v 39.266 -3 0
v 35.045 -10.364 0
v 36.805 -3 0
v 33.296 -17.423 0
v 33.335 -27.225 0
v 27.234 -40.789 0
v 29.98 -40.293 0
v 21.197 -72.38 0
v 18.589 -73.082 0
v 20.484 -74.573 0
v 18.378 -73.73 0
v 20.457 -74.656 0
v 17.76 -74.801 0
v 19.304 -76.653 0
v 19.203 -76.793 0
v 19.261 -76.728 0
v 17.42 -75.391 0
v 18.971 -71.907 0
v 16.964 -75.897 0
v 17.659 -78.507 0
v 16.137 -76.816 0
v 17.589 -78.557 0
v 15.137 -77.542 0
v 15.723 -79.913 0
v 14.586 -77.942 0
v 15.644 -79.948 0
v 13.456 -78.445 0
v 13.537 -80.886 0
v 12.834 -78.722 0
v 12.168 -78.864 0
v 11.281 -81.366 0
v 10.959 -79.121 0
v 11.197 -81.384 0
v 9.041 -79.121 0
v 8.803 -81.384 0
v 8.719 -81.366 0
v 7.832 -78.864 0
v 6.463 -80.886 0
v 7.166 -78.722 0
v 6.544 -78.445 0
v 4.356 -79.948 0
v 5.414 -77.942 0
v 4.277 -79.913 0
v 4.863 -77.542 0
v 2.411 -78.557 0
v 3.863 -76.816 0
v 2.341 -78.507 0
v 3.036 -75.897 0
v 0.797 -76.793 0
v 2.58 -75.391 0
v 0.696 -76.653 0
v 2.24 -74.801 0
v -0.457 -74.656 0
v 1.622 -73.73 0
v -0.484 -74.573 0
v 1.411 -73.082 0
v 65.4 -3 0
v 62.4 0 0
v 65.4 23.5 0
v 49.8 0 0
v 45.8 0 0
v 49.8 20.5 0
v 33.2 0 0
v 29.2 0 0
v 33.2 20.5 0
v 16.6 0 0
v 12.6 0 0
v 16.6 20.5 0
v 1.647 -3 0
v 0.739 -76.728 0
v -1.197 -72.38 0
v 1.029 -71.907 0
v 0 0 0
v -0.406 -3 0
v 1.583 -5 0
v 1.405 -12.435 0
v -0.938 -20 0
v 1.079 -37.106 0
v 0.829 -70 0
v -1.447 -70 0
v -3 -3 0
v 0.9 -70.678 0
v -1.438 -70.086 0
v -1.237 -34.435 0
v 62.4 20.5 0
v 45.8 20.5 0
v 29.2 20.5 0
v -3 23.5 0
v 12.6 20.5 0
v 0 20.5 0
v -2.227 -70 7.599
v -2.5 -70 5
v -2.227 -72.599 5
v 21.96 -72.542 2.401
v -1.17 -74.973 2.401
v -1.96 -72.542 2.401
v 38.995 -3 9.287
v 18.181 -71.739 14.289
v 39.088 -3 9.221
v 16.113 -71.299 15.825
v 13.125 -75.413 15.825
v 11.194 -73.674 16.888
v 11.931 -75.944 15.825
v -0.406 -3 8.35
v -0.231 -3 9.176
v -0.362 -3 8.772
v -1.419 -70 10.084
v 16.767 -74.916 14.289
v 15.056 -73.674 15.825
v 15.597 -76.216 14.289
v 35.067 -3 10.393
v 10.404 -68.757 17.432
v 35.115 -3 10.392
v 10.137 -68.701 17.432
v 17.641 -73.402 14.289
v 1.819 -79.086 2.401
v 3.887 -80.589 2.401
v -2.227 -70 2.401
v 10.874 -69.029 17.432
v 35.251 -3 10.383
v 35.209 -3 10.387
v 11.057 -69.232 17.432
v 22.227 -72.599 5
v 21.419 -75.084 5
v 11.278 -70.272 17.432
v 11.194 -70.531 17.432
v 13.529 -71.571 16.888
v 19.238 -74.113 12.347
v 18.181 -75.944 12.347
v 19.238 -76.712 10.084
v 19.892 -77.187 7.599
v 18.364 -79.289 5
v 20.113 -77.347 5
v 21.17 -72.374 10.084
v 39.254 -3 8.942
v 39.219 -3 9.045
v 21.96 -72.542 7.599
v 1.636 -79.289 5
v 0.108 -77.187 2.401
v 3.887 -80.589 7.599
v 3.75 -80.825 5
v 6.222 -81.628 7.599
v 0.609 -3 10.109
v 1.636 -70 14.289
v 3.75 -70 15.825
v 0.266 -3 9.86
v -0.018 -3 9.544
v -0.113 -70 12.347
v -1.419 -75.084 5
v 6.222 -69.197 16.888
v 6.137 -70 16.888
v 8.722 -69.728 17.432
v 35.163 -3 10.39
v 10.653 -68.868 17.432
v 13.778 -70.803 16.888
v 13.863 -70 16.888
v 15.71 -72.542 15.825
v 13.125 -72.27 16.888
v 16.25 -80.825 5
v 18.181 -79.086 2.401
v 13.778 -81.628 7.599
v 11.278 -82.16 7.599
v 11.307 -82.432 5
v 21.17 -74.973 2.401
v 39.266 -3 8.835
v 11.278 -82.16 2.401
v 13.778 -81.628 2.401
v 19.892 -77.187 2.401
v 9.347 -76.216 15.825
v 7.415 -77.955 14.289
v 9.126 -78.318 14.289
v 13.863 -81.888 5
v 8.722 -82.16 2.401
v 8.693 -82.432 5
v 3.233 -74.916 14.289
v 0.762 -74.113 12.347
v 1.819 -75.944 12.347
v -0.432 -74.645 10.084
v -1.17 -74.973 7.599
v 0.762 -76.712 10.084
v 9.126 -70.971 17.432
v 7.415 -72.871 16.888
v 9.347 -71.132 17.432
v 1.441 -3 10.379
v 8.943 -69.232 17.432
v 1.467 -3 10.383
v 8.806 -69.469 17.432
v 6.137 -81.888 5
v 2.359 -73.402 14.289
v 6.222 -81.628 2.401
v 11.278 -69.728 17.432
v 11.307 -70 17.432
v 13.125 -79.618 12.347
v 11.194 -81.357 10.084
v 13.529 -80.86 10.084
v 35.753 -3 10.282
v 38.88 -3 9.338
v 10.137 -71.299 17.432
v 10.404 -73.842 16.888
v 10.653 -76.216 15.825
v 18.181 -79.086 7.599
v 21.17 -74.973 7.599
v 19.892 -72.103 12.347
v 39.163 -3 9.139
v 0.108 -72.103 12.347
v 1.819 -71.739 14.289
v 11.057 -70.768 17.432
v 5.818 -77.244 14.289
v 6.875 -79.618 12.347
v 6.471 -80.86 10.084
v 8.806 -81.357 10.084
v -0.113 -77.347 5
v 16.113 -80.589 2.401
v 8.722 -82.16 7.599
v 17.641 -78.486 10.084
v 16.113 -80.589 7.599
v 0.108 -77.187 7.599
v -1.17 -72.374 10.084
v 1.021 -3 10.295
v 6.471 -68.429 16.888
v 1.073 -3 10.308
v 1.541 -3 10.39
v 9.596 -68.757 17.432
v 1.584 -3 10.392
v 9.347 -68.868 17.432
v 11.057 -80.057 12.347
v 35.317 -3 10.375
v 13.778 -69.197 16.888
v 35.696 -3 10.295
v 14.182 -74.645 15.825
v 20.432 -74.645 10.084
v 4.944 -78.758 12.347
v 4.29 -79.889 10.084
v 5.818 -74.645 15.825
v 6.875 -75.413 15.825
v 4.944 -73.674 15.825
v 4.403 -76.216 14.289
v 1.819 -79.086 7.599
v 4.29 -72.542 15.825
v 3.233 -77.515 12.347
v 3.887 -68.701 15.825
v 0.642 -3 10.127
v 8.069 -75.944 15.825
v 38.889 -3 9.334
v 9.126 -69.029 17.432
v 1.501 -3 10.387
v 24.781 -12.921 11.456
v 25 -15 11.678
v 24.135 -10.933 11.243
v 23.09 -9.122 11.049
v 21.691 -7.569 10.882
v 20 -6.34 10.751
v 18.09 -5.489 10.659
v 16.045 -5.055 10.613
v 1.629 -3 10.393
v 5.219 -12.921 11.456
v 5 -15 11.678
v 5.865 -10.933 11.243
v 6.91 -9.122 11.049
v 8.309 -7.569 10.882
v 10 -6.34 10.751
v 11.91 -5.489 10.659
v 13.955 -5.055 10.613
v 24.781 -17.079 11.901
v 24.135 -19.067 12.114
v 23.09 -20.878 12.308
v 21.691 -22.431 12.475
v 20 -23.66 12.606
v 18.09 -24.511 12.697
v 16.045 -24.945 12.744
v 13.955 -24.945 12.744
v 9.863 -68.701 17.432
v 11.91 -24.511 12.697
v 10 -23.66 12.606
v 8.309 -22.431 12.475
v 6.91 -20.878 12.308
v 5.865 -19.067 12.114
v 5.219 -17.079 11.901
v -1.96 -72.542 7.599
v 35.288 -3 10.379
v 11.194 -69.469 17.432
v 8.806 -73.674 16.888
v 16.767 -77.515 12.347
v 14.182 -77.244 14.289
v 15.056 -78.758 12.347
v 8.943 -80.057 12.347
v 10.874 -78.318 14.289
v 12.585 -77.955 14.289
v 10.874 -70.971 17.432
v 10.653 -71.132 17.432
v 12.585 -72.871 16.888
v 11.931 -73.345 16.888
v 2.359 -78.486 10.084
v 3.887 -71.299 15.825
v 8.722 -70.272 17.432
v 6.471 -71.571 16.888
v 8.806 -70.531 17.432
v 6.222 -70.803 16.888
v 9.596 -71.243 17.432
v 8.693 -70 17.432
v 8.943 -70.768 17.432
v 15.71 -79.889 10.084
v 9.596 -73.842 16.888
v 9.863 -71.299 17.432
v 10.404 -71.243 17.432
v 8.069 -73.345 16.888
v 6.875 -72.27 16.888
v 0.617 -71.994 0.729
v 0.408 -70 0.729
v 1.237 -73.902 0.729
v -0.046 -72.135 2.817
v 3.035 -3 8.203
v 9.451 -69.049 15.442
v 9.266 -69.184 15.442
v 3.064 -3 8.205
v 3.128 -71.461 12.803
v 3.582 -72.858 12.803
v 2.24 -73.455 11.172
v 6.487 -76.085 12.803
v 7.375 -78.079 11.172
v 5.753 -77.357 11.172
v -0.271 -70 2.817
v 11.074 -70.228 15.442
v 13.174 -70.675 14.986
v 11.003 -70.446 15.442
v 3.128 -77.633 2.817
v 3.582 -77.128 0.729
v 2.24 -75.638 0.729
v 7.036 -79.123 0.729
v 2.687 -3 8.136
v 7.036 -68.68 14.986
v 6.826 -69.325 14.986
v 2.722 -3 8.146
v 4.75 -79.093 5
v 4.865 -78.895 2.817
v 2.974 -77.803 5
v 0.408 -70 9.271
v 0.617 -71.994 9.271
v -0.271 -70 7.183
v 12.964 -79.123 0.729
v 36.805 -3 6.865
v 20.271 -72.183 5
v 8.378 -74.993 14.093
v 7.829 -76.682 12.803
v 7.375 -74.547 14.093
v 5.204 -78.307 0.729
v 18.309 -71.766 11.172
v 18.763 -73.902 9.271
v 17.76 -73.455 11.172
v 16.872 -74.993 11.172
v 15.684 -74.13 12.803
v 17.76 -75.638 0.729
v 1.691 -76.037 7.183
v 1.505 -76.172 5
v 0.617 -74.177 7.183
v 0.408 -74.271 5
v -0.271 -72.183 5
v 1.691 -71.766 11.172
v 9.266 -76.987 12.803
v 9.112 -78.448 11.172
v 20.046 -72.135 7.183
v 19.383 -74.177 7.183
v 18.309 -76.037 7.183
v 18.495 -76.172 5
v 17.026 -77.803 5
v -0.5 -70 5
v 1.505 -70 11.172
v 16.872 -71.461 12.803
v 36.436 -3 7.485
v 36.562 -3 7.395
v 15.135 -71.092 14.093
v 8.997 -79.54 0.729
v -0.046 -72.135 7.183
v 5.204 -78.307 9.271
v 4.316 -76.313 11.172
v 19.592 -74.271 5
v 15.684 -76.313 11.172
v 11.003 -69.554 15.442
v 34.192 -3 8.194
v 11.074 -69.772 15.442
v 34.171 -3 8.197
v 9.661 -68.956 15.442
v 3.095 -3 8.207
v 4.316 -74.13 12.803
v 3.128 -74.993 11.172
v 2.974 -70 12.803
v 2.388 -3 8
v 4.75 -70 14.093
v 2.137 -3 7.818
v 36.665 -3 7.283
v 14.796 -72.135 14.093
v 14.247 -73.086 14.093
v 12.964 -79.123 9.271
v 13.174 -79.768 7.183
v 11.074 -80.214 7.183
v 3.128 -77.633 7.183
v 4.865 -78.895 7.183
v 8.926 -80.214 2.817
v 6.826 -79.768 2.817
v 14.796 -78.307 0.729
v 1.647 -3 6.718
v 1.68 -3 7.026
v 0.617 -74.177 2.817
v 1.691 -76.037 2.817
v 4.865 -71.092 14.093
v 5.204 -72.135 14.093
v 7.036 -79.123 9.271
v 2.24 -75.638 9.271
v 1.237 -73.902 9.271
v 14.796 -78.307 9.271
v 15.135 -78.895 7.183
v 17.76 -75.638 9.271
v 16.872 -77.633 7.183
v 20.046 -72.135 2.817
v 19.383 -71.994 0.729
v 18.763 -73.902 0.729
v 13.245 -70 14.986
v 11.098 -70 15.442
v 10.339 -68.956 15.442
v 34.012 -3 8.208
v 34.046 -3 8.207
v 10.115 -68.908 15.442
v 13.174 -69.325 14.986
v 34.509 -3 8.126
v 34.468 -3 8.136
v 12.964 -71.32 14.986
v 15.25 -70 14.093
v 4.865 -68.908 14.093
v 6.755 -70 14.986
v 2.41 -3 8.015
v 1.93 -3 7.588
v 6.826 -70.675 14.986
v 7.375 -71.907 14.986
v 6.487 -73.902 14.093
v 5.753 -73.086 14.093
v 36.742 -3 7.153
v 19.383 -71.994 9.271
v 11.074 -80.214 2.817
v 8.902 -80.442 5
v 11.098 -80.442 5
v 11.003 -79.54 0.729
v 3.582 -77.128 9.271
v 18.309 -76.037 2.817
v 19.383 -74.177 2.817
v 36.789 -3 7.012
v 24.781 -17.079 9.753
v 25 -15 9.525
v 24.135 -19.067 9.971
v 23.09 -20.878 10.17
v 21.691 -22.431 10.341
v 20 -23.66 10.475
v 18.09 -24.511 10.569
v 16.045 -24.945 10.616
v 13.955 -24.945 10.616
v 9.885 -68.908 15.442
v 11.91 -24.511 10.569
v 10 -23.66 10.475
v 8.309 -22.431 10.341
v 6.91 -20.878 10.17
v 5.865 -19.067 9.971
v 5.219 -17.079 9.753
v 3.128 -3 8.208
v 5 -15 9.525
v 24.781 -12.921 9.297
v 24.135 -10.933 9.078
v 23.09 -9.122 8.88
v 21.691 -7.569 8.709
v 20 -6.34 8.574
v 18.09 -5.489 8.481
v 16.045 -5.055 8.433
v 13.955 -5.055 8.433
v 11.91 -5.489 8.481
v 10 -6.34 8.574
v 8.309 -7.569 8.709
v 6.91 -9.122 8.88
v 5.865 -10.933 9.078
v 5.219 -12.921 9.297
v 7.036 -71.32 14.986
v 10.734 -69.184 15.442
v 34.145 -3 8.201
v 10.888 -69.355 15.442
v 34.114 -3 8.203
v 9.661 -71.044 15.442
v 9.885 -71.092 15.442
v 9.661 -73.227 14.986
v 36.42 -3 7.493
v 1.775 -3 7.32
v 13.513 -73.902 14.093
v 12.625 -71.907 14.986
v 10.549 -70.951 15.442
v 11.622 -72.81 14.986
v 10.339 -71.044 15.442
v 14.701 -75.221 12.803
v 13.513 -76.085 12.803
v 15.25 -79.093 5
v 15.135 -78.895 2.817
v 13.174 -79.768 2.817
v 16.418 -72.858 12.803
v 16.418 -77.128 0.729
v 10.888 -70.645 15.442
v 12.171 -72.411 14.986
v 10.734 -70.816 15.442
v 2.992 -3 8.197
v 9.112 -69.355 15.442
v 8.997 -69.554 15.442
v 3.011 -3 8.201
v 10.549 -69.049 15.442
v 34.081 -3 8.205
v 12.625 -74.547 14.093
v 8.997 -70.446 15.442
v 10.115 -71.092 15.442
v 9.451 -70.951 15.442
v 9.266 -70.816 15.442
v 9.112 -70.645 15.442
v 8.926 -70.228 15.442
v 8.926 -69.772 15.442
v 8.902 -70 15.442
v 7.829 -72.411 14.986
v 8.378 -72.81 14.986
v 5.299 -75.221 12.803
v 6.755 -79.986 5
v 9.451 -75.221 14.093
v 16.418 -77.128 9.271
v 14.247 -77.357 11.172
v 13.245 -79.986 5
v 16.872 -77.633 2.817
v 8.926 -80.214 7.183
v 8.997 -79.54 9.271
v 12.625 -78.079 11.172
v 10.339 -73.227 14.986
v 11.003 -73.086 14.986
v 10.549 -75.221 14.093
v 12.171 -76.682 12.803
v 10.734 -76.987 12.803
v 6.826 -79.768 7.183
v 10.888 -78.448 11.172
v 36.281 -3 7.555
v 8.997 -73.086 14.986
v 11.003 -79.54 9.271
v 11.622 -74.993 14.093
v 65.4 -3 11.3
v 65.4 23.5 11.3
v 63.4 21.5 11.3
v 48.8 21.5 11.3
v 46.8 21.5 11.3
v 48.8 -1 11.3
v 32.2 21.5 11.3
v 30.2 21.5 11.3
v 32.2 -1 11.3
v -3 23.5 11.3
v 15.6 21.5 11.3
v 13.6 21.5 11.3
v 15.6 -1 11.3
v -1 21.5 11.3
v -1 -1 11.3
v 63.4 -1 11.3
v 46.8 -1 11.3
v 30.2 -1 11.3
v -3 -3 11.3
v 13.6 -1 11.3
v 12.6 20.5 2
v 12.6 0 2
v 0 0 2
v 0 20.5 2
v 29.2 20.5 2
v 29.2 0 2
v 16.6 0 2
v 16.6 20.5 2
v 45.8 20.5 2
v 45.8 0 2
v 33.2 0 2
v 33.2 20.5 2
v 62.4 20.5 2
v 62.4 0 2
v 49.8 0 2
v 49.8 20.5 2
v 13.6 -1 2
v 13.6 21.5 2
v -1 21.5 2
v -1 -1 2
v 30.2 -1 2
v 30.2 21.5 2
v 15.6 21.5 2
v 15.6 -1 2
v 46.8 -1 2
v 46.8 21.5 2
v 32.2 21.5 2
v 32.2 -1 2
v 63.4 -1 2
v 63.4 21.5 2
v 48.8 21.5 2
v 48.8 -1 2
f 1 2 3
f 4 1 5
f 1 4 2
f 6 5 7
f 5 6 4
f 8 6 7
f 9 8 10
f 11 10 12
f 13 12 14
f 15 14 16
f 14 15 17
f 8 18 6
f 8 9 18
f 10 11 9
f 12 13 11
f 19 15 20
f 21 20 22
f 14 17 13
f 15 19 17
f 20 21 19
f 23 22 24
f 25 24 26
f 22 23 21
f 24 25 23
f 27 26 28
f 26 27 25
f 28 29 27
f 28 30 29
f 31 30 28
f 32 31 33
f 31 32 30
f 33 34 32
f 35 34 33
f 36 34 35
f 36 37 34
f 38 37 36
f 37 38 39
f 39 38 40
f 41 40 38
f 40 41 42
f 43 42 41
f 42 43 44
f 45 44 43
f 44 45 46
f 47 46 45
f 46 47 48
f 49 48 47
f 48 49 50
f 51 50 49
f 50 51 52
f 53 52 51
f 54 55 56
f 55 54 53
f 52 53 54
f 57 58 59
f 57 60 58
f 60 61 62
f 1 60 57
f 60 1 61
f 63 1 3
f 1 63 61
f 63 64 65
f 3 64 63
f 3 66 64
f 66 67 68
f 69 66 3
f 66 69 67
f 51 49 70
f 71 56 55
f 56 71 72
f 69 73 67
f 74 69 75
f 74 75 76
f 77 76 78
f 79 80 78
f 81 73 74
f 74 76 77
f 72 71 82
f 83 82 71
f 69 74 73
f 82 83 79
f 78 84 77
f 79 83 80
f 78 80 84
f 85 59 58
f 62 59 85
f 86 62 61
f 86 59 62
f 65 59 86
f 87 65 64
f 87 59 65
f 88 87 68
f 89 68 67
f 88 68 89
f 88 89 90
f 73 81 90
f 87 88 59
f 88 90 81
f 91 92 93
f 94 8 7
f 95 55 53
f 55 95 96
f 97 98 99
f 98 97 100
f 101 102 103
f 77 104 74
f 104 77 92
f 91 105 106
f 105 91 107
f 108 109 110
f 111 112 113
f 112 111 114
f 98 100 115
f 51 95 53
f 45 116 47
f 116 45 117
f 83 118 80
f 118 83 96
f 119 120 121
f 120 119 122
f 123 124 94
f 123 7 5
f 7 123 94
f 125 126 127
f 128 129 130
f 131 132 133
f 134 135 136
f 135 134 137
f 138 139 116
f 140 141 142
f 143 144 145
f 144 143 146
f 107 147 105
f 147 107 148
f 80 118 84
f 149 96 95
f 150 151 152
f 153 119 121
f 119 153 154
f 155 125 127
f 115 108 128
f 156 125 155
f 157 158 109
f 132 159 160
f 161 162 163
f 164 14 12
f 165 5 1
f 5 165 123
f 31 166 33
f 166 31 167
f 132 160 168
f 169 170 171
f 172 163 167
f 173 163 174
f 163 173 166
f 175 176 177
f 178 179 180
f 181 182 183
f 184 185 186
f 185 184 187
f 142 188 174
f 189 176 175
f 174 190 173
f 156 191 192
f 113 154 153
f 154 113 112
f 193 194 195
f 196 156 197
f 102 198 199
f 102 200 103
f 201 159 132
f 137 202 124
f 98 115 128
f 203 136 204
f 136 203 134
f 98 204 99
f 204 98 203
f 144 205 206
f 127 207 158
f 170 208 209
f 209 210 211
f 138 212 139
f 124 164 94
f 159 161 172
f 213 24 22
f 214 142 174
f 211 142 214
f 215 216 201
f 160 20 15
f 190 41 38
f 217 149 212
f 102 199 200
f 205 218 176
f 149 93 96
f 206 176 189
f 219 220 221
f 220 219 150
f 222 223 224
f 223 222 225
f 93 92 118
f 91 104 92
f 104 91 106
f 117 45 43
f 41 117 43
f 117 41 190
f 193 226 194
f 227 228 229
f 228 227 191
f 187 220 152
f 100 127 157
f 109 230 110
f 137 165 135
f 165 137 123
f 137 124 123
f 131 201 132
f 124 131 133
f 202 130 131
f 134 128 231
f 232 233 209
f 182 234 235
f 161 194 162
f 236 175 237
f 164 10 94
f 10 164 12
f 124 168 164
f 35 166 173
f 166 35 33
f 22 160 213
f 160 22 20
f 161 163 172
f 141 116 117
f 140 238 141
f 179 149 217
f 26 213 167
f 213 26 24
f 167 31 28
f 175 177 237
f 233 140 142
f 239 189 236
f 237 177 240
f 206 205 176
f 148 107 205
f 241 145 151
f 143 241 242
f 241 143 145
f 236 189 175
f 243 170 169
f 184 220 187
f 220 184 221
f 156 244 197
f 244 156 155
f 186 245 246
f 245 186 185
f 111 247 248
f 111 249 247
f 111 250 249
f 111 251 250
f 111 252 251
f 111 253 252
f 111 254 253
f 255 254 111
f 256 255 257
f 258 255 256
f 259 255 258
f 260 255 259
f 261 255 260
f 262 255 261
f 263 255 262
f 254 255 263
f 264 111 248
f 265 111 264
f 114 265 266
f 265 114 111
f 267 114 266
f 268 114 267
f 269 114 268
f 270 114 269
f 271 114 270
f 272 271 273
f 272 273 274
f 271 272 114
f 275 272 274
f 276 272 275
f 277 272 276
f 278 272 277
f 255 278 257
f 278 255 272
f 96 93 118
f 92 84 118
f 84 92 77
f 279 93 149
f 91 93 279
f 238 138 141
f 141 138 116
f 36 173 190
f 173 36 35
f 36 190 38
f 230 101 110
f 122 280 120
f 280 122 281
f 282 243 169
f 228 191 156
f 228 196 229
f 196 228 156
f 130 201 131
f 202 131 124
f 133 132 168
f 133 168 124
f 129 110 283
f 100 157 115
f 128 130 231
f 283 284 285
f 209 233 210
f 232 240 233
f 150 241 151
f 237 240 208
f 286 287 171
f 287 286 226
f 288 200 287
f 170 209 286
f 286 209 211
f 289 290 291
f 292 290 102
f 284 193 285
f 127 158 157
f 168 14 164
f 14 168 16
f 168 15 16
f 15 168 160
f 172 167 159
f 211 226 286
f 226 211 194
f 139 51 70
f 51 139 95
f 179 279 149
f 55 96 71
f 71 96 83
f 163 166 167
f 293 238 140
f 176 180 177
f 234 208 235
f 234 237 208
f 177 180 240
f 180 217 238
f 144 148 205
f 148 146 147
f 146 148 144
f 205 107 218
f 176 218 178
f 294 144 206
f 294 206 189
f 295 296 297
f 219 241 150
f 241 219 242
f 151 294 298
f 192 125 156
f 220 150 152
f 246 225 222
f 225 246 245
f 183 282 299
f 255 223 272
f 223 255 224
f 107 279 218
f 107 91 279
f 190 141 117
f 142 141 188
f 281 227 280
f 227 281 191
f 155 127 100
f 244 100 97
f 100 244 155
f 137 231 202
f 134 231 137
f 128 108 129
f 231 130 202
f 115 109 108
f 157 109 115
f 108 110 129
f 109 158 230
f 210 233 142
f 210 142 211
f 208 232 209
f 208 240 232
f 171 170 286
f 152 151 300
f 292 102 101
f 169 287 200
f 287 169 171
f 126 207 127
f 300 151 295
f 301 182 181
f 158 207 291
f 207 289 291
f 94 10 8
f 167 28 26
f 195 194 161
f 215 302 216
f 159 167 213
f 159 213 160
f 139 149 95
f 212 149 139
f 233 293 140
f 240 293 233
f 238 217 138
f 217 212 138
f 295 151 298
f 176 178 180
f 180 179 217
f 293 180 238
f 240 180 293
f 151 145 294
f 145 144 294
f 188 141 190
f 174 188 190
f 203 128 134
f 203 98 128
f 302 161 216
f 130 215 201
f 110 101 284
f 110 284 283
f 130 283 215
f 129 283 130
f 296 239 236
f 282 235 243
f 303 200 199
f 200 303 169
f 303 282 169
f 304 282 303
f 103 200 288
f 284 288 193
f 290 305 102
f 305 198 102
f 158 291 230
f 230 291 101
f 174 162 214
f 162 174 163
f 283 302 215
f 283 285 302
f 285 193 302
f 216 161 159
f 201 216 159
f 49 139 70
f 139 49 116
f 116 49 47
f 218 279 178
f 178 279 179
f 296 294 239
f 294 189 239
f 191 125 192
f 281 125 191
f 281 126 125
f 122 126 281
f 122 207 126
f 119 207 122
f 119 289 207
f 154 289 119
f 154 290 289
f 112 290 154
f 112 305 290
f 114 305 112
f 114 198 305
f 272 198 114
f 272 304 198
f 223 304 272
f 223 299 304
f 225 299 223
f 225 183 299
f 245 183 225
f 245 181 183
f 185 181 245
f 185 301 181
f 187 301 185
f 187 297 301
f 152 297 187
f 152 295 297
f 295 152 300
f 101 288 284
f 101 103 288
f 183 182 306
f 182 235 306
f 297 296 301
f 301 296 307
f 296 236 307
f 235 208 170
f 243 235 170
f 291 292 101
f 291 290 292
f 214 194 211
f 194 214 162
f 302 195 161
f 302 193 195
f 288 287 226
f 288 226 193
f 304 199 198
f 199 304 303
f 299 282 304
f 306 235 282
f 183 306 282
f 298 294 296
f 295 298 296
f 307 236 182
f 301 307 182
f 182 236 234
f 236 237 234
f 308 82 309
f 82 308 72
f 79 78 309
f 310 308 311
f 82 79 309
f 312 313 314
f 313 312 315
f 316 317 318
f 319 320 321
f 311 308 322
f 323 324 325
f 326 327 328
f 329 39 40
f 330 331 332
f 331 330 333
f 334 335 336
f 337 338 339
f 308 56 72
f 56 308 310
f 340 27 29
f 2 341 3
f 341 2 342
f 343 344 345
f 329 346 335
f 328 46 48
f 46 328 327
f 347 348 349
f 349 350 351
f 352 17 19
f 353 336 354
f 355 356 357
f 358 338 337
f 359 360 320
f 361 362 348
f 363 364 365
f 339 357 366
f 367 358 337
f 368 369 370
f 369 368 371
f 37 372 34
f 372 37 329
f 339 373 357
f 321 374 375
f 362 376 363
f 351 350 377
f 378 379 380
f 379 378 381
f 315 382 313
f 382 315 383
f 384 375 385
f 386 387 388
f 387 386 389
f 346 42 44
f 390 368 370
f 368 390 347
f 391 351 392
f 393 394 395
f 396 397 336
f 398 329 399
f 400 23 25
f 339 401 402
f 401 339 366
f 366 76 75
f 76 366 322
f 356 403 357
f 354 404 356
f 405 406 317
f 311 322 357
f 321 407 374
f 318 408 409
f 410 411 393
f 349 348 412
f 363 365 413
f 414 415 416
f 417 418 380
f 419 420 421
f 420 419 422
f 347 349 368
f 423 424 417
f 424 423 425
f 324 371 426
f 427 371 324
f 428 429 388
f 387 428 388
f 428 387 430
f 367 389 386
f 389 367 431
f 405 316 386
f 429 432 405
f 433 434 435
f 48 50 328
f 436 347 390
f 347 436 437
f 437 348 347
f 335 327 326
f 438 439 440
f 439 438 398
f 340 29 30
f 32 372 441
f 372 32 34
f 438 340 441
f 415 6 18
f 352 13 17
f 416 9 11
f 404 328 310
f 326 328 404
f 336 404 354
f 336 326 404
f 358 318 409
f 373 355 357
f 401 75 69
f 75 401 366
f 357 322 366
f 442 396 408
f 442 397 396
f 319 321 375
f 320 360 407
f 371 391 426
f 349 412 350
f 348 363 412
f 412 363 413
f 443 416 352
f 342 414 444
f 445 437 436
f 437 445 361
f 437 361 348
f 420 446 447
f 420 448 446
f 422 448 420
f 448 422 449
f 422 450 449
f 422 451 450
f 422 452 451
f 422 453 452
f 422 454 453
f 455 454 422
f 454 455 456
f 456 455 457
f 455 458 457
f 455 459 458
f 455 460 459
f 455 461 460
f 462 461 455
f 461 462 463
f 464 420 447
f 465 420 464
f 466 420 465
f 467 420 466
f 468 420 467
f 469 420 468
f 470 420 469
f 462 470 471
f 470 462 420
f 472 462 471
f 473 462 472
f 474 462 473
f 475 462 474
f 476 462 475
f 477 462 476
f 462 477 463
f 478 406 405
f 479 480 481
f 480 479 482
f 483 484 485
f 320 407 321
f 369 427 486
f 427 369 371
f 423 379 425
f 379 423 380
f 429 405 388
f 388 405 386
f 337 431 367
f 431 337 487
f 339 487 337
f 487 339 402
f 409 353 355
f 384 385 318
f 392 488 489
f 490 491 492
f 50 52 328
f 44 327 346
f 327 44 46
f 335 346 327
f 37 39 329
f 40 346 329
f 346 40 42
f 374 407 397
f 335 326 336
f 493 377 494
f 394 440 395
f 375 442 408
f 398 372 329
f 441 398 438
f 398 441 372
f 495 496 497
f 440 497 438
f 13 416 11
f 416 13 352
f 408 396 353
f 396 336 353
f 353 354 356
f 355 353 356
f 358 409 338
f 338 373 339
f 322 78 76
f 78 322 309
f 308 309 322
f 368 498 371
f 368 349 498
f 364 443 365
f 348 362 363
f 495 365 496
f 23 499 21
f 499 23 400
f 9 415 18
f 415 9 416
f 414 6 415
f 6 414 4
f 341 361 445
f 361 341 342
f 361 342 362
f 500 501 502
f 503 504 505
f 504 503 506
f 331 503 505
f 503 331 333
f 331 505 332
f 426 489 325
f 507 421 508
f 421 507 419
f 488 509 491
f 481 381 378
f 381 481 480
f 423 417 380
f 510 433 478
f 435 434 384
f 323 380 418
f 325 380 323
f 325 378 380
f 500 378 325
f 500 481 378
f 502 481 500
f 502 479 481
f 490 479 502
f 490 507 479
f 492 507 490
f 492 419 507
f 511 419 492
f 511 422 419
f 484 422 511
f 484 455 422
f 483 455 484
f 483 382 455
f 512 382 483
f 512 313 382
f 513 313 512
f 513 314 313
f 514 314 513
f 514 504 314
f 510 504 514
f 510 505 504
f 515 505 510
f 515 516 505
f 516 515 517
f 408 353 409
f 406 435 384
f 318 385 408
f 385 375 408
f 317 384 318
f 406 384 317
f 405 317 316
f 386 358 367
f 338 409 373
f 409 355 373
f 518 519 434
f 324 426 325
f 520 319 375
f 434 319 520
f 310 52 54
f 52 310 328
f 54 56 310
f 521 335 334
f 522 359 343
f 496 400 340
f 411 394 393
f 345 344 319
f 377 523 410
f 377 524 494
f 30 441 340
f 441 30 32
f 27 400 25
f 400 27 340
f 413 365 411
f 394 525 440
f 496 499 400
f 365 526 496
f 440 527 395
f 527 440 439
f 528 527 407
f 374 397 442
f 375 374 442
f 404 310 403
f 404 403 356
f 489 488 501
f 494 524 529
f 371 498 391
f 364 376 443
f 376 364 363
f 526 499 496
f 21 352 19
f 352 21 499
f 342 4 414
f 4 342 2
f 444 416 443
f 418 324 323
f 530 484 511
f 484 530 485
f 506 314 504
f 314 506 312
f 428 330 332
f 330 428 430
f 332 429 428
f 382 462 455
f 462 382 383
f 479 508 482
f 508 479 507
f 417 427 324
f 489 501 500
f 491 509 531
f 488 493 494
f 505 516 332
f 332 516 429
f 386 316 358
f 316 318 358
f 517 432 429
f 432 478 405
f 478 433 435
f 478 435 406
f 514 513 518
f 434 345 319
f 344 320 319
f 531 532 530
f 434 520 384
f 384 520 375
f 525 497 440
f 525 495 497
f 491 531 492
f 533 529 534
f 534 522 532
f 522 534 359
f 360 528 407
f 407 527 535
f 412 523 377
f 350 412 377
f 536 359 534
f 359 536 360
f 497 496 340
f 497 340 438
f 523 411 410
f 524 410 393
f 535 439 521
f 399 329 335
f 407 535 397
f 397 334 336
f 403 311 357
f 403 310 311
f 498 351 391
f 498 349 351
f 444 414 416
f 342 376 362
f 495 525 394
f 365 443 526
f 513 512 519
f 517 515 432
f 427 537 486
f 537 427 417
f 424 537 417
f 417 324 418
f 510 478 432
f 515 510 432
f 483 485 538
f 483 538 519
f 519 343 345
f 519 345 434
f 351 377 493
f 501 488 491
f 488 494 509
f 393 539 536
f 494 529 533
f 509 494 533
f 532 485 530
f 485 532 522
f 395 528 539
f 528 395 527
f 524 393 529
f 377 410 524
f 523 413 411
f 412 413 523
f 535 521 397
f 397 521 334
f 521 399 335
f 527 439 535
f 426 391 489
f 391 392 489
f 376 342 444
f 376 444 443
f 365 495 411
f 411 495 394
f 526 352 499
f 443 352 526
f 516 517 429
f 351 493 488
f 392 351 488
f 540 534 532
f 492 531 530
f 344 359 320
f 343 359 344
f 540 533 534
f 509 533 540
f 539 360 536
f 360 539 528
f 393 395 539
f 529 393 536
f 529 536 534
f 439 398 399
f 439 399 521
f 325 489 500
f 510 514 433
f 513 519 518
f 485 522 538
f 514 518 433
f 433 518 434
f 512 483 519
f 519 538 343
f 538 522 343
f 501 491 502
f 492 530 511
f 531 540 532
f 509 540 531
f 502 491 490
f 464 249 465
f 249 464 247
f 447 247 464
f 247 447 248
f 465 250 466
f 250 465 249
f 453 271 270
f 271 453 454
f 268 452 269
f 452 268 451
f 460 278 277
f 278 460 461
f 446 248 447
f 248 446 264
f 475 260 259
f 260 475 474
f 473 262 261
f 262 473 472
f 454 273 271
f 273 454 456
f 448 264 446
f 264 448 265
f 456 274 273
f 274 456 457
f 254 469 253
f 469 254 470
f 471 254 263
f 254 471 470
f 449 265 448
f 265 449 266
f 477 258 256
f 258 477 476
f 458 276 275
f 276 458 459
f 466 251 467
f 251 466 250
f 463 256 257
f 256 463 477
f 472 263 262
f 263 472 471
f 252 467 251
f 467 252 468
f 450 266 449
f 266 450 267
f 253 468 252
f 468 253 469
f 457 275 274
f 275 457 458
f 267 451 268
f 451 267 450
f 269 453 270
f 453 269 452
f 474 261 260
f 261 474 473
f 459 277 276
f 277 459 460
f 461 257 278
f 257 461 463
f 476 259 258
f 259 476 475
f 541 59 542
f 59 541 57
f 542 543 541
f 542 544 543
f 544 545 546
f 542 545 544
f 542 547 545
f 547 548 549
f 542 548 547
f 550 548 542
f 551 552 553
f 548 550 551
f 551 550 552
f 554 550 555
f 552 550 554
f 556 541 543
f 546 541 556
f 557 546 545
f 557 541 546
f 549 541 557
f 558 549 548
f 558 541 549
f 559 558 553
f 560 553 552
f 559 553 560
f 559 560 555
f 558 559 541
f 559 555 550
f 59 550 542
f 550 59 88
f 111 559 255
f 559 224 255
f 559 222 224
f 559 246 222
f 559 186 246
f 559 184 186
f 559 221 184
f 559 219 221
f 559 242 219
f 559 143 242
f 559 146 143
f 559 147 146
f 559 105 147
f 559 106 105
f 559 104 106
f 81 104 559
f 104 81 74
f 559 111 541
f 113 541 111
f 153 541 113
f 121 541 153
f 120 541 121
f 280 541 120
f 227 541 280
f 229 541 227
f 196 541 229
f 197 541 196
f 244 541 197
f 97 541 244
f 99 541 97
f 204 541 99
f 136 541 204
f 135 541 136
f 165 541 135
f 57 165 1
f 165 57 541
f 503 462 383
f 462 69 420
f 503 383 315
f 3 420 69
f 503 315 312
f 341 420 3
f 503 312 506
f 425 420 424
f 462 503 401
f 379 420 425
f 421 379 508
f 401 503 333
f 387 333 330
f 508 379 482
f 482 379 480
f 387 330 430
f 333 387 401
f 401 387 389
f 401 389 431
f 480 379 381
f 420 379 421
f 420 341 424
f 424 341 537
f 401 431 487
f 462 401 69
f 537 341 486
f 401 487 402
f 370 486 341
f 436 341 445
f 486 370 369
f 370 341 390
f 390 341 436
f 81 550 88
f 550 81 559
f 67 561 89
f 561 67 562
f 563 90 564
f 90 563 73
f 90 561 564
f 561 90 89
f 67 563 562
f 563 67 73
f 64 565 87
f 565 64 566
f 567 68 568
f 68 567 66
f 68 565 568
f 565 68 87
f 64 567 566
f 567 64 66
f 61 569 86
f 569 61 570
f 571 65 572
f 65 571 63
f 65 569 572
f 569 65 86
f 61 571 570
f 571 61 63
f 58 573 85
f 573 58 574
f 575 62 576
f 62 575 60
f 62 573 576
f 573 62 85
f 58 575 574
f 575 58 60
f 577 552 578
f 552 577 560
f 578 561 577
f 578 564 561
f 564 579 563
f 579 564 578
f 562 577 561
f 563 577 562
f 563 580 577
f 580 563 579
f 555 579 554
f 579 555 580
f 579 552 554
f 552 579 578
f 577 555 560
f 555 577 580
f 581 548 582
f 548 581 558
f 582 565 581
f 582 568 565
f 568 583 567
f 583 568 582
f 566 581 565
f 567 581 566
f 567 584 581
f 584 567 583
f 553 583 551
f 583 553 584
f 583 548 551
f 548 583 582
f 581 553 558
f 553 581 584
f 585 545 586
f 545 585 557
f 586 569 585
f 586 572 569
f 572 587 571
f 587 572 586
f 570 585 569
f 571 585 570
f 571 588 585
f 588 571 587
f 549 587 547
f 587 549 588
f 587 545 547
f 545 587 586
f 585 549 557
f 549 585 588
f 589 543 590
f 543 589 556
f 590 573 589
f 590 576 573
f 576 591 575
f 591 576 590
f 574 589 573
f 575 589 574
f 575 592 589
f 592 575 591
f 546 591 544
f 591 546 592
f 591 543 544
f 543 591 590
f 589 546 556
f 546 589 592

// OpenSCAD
/*
 Holds a row of DPDT switches, for manually moving
 excahauler robot arm.
*/

switch_box=[12.6,20.5,21.3];
nswitch=4;
floor=2;
wall=3;

module switches() 
{
    for (s=[0:nswitch-0.5])
        translate([(switch_box[0]+4)*s,0,-floor])
            children();
}

module switchrow(bigger,higher=0) {
    switches() 
        translate([-bigger,-bigger,+floor+higher])
            cube(switch_box+[2*bigger,2*bigger,-10]);
}

module handle_stick(shrink=0) {
    intersection() {
        translate([0,0,100-0.01*shrink]) cube([200,200,200],center=true);
        hull() {
            translate([10,-70,5]) sphere(d=25-2*shrink);
            translate([shrink,shrink,-3+shrink])
                cube([40-2*shrink,10-2*shrink,12-2*shrink]);
        }
    }
}

module handle_outside()
{
    hull() switchrow(wall,0);
    
    difference() {
        handle_stick(0);
        handle_stick(2);
        translate([15,-15,0]) cylinder(d=20,h=100);
    }
}

difference() {
    handle_outside();
    switchrow(0.0,-0.1); // hole for switch
    switchrow(1.0,2.0); // clearance around switch
}
